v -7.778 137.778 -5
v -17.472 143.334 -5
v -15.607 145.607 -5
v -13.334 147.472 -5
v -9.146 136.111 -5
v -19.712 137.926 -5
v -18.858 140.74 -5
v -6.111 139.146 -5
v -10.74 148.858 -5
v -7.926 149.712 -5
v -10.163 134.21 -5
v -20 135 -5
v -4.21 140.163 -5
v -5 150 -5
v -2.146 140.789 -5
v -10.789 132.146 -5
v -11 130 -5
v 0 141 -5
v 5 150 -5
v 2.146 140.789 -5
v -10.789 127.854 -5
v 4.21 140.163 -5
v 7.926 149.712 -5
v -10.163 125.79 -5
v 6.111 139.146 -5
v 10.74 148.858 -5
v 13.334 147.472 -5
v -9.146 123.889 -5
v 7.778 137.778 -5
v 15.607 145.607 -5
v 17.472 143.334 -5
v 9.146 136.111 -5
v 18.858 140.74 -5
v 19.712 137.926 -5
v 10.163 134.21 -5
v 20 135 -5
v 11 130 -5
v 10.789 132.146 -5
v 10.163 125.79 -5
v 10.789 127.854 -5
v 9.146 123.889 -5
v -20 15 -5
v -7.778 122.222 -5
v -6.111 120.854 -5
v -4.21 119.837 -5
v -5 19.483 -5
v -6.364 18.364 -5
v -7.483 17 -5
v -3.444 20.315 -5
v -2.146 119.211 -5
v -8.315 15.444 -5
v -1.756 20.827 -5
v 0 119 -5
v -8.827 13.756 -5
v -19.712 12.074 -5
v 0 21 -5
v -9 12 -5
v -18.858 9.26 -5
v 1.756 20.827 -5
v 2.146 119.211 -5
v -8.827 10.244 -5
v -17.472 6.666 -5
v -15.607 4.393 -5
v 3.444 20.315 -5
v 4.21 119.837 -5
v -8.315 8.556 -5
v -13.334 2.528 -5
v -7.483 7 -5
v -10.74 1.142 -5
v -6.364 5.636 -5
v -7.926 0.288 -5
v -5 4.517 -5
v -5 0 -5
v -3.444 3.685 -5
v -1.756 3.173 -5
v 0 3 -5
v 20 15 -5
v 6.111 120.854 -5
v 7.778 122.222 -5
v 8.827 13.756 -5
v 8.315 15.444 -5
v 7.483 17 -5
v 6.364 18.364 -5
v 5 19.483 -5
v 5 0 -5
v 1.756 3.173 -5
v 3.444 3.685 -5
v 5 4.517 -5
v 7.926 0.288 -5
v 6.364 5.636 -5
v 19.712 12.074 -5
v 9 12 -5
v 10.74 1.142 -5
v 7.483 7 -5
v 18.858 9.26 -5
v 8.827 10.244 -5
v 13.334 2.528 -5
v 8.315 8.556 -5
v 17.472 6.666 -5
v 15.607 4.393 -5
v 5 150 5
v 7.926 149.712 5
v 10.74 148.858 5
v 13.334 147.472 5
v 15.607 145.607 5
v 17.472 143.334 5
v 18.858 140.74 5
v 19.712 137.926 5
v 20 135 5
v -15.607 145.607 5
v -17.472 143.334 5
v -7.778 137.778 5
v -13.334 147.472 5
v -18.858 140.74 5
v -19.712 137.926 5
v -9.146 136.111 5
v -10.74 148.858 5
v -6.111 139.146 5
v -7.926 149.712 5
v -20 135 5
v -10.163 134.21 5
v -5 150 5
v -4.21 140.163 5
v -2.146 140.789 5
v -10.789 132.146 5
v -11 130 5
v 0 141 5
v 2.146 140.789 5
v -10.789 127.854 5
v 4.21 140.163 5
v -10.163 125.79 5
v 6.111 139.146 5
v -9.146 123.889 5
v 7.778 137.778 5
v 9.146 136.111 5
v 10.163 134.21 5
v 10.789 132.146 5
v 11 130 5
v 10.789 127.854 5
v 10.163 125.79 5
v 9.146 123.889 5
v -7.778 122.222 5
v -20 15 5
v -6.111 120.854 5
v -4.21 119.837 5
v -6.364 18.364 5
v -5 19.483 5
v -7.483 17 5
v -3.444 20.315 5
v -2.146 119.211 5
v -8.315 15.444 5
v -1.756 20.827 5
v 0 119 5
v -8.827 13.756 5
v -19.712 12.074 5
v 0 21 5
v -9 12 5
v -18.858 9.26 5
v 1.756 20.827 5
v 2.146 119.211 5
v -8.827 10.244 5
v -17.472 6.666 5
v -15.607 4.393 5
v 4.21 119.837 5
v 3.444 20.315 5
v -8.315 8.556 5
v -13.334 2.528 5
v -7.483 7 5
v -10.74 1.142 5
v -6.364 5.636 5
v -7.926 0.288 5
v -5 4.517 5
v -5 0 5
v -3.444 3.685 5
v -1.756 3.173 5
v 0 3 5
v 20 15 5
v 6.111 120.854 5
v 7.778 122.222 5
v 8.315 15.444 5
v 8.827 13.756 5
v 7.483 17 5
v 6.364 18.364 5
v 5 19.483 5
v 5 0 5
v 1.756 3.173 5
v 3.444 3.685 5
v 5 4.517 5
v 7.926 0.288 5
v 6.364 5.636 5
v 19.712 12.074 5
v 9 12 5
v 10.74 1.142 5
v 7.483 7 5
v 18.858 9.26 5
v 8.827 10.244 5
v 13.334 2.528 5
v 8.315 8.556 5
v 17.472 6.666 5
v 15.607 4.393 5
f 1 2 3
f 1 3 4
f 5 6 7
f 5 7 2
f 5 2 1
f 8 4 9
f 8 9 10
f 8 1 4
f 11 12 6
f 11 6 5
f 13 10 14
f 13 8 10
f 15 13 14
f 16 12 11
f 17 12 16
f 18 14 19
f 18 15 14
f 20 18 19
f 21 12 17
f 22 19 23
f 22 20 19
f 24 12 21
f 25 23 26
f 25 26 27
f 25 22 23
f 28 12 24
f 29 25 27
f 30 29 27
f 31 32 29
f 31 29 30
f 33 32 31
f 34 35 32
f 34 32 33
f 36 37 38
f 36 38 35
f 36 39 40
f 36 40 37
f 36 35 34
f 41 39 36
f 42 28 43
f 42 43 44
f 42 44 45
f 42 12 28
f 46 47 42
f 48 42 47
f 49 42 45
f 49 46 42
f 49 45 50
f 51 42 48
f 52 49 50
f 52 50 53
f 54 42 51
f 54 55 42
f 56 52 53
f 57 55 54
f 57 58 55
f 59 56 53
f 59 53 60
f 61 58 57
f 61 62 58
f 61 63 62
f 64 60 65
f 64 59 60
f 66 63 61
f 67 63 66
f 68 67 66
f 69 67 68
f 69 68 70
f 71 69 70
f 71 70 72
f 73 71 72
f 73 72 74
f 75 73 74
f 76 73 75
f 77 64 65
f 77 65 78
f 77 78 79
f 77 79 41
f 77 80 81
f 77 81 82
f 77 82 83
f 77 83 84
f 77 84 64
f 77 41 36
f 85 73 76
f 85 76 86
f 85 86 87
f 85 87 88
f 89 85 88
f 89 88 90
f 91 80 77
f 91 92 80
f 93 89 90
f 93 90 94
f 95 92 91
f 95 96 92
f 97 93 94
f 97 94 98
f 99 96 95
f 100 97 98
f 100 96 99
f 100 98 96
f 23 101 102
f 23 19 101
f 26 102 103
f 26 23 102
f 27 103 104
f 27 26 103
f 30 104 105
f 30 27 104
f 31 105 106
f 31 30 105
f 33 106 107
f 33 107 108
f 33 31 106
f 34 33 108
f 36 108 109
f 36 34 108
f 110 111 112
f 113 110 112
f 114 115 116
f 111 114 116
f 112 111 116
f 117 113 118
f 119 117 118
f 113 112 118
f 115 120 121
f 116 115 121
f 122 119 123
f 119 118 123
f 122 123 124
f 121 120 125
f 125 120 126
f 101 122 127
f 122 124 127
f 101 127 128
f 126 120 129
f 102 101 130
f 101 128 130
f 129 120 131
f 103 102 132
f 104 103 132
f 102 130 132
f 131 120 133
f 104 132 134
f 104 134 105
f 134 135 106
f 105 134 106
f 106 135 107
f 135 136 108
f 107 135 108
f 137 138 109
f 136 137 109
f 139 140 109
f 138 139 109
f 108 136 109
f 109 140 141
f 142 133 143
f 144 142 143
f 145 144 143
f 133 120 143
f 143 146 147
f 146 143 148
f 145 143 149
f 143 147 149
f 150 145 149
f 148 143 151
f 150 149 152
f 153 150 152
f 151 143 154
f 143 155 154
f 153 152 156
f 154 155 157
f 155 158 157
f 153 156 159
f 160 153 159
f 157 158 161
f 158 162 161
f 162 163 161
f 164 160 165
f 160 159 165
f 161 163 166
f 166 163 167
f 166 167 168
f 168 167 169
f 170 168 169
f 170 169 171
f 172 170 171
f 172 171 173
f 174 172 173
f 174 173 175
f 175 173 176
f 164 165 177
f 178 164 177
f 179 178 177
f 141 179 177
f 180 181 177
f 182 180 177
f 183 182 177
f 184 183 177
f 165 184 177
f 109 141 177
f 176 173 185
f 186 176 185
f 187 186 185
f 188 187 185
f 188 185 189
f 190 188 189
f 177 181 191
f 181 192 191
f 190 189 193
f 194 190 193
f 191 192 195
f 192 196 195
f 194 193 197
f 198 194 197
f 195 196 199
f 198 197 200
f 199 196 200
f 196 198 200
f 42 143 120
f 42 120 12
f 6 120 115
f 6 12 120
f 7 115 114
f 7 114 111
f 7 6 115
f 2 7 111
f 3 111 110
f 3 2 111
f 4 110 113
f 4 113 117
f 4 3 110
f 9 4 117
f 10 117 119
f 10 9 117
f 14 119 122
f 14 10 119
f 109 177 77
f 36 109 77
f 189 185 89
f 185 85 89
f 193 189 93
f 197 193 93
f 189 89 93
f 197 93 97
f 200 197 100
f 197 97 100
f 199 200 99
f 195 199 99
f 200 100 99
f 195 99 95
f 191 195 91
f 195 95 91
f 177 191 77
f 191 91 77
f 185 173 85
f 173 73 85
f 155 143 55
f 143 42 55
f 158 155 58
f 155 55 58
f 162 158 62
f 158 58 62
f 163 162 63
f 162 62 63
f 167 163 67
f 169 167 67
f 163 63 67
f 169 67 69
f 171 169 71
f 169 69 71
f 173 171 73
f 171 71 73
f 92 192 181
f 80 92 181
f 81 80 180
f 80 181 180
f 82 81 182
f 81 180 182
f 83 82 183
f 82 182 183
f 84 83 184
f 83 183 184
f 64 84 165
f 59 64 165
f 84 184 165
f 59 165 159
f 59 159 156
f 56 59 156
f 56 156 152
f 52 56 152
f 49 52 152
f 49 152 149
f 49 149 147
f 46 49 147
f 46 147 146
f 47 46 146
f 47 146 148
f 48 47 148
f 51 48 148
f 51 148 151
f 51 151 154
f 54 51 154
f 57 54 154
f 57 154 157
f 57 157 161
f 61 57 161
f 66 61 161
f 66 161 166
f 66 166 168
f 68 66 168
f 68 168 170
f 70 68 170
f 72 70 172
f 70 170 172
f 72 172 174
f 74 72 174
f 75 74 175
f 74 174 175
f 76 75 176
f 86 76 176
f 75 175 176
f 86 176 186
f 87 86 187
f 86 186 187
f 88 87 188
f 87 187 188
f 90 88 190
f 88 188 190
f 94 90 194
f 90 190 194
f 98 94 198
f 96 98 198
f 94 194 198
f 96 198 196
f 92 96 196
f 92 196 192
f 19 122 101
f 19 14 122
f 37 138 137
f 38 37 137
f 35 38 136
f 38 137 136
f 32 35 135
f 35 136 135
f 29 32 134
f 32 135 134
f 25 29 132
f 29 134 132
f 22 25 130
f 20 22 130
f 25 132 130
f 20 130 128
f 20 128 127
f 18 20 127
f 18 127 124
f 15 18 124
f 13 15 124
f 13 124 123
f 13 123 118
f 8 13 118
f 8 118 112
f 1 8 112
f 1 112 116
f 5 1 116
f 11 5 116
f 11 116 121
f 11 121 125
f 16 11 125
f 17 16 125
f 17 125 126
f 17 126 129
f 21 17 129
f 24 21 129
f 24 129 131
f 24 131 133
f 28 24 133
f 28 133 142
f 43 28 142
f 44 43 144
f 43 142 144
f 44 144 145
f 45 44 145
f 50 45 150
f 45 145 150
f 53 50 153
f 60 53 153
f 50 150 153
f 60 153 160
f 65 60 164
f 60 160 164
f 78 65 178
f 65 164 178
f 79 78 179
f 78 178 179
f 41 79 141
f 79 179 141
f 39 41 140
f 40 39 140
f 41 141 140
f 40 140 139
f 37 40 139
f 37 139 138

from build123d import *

# Parameters (mm, degrees)
SKIZZE1_W                       = 40
SKIZZE1_H                       = 10
AUFSATZ_LINEAR_AUSTRAGEN1_DEPTH = 150
SKIZZE2_R                       = 11
SCHNITT_LINEAR_AUSTRAGEN1_DEPTH = 152.657508881
SKIZZE3_R                       = 9
SCHNITT_LINEAR_AUSTRAGEN5_DEPTH = 152.657508881
VERRUNDUNG1_R                   = 15


with BuildPart() as part:
    # Skizze1 → Aufsatz-Linear austragen1 (new body)
    with BuildSketch(Plane(origin=(0, 0, 0), x_dir=(1, 0, 0), z_dir=(0, 1, 0))):
        Rectangle(SKIZZE1_W, SKIZZE1_H)
    extrude(amount=AUFSATZ_LINEAR_AUSTRAGEN1_DEPTH)

    # Skizze2 → Schnitt-Linear austragen1 (cut, through all)
    with BuildSketch(Plane.XY.offset(5)):
        with Locations((0, 130)):
            Circle(SKIZZE2_R)
    extrude(amount=-SCHNITT_LINEAR_AUSTRAGEN1_DEPTH, mode=Mode.SUBTRACT)

    # Skizze3 → Schnitt-Linear austragen5 (cut, through all)
    with BuildSketch(Plane.XY.offset(5)):
        with Locations((0, 12)):
            Circle(SKIZZE3_R)
    extrude(amount=-SCHNITT_LINEAR_AUSTRAGEN5_DEPTH, mode=Mode.SUBTRACT)

    # Verrundung1
    verrundung1_edges = [part.edges().sort_by_distance(p)[0] for p in [
        (-20, 150, 0),
        (20, 150, 0),
        (-20, 0, 0),
        (20, 0, 0),
    ]]
    fillet(verrundung1_edges, radius=VERRUNDUNG1_R)


solid = part.part
